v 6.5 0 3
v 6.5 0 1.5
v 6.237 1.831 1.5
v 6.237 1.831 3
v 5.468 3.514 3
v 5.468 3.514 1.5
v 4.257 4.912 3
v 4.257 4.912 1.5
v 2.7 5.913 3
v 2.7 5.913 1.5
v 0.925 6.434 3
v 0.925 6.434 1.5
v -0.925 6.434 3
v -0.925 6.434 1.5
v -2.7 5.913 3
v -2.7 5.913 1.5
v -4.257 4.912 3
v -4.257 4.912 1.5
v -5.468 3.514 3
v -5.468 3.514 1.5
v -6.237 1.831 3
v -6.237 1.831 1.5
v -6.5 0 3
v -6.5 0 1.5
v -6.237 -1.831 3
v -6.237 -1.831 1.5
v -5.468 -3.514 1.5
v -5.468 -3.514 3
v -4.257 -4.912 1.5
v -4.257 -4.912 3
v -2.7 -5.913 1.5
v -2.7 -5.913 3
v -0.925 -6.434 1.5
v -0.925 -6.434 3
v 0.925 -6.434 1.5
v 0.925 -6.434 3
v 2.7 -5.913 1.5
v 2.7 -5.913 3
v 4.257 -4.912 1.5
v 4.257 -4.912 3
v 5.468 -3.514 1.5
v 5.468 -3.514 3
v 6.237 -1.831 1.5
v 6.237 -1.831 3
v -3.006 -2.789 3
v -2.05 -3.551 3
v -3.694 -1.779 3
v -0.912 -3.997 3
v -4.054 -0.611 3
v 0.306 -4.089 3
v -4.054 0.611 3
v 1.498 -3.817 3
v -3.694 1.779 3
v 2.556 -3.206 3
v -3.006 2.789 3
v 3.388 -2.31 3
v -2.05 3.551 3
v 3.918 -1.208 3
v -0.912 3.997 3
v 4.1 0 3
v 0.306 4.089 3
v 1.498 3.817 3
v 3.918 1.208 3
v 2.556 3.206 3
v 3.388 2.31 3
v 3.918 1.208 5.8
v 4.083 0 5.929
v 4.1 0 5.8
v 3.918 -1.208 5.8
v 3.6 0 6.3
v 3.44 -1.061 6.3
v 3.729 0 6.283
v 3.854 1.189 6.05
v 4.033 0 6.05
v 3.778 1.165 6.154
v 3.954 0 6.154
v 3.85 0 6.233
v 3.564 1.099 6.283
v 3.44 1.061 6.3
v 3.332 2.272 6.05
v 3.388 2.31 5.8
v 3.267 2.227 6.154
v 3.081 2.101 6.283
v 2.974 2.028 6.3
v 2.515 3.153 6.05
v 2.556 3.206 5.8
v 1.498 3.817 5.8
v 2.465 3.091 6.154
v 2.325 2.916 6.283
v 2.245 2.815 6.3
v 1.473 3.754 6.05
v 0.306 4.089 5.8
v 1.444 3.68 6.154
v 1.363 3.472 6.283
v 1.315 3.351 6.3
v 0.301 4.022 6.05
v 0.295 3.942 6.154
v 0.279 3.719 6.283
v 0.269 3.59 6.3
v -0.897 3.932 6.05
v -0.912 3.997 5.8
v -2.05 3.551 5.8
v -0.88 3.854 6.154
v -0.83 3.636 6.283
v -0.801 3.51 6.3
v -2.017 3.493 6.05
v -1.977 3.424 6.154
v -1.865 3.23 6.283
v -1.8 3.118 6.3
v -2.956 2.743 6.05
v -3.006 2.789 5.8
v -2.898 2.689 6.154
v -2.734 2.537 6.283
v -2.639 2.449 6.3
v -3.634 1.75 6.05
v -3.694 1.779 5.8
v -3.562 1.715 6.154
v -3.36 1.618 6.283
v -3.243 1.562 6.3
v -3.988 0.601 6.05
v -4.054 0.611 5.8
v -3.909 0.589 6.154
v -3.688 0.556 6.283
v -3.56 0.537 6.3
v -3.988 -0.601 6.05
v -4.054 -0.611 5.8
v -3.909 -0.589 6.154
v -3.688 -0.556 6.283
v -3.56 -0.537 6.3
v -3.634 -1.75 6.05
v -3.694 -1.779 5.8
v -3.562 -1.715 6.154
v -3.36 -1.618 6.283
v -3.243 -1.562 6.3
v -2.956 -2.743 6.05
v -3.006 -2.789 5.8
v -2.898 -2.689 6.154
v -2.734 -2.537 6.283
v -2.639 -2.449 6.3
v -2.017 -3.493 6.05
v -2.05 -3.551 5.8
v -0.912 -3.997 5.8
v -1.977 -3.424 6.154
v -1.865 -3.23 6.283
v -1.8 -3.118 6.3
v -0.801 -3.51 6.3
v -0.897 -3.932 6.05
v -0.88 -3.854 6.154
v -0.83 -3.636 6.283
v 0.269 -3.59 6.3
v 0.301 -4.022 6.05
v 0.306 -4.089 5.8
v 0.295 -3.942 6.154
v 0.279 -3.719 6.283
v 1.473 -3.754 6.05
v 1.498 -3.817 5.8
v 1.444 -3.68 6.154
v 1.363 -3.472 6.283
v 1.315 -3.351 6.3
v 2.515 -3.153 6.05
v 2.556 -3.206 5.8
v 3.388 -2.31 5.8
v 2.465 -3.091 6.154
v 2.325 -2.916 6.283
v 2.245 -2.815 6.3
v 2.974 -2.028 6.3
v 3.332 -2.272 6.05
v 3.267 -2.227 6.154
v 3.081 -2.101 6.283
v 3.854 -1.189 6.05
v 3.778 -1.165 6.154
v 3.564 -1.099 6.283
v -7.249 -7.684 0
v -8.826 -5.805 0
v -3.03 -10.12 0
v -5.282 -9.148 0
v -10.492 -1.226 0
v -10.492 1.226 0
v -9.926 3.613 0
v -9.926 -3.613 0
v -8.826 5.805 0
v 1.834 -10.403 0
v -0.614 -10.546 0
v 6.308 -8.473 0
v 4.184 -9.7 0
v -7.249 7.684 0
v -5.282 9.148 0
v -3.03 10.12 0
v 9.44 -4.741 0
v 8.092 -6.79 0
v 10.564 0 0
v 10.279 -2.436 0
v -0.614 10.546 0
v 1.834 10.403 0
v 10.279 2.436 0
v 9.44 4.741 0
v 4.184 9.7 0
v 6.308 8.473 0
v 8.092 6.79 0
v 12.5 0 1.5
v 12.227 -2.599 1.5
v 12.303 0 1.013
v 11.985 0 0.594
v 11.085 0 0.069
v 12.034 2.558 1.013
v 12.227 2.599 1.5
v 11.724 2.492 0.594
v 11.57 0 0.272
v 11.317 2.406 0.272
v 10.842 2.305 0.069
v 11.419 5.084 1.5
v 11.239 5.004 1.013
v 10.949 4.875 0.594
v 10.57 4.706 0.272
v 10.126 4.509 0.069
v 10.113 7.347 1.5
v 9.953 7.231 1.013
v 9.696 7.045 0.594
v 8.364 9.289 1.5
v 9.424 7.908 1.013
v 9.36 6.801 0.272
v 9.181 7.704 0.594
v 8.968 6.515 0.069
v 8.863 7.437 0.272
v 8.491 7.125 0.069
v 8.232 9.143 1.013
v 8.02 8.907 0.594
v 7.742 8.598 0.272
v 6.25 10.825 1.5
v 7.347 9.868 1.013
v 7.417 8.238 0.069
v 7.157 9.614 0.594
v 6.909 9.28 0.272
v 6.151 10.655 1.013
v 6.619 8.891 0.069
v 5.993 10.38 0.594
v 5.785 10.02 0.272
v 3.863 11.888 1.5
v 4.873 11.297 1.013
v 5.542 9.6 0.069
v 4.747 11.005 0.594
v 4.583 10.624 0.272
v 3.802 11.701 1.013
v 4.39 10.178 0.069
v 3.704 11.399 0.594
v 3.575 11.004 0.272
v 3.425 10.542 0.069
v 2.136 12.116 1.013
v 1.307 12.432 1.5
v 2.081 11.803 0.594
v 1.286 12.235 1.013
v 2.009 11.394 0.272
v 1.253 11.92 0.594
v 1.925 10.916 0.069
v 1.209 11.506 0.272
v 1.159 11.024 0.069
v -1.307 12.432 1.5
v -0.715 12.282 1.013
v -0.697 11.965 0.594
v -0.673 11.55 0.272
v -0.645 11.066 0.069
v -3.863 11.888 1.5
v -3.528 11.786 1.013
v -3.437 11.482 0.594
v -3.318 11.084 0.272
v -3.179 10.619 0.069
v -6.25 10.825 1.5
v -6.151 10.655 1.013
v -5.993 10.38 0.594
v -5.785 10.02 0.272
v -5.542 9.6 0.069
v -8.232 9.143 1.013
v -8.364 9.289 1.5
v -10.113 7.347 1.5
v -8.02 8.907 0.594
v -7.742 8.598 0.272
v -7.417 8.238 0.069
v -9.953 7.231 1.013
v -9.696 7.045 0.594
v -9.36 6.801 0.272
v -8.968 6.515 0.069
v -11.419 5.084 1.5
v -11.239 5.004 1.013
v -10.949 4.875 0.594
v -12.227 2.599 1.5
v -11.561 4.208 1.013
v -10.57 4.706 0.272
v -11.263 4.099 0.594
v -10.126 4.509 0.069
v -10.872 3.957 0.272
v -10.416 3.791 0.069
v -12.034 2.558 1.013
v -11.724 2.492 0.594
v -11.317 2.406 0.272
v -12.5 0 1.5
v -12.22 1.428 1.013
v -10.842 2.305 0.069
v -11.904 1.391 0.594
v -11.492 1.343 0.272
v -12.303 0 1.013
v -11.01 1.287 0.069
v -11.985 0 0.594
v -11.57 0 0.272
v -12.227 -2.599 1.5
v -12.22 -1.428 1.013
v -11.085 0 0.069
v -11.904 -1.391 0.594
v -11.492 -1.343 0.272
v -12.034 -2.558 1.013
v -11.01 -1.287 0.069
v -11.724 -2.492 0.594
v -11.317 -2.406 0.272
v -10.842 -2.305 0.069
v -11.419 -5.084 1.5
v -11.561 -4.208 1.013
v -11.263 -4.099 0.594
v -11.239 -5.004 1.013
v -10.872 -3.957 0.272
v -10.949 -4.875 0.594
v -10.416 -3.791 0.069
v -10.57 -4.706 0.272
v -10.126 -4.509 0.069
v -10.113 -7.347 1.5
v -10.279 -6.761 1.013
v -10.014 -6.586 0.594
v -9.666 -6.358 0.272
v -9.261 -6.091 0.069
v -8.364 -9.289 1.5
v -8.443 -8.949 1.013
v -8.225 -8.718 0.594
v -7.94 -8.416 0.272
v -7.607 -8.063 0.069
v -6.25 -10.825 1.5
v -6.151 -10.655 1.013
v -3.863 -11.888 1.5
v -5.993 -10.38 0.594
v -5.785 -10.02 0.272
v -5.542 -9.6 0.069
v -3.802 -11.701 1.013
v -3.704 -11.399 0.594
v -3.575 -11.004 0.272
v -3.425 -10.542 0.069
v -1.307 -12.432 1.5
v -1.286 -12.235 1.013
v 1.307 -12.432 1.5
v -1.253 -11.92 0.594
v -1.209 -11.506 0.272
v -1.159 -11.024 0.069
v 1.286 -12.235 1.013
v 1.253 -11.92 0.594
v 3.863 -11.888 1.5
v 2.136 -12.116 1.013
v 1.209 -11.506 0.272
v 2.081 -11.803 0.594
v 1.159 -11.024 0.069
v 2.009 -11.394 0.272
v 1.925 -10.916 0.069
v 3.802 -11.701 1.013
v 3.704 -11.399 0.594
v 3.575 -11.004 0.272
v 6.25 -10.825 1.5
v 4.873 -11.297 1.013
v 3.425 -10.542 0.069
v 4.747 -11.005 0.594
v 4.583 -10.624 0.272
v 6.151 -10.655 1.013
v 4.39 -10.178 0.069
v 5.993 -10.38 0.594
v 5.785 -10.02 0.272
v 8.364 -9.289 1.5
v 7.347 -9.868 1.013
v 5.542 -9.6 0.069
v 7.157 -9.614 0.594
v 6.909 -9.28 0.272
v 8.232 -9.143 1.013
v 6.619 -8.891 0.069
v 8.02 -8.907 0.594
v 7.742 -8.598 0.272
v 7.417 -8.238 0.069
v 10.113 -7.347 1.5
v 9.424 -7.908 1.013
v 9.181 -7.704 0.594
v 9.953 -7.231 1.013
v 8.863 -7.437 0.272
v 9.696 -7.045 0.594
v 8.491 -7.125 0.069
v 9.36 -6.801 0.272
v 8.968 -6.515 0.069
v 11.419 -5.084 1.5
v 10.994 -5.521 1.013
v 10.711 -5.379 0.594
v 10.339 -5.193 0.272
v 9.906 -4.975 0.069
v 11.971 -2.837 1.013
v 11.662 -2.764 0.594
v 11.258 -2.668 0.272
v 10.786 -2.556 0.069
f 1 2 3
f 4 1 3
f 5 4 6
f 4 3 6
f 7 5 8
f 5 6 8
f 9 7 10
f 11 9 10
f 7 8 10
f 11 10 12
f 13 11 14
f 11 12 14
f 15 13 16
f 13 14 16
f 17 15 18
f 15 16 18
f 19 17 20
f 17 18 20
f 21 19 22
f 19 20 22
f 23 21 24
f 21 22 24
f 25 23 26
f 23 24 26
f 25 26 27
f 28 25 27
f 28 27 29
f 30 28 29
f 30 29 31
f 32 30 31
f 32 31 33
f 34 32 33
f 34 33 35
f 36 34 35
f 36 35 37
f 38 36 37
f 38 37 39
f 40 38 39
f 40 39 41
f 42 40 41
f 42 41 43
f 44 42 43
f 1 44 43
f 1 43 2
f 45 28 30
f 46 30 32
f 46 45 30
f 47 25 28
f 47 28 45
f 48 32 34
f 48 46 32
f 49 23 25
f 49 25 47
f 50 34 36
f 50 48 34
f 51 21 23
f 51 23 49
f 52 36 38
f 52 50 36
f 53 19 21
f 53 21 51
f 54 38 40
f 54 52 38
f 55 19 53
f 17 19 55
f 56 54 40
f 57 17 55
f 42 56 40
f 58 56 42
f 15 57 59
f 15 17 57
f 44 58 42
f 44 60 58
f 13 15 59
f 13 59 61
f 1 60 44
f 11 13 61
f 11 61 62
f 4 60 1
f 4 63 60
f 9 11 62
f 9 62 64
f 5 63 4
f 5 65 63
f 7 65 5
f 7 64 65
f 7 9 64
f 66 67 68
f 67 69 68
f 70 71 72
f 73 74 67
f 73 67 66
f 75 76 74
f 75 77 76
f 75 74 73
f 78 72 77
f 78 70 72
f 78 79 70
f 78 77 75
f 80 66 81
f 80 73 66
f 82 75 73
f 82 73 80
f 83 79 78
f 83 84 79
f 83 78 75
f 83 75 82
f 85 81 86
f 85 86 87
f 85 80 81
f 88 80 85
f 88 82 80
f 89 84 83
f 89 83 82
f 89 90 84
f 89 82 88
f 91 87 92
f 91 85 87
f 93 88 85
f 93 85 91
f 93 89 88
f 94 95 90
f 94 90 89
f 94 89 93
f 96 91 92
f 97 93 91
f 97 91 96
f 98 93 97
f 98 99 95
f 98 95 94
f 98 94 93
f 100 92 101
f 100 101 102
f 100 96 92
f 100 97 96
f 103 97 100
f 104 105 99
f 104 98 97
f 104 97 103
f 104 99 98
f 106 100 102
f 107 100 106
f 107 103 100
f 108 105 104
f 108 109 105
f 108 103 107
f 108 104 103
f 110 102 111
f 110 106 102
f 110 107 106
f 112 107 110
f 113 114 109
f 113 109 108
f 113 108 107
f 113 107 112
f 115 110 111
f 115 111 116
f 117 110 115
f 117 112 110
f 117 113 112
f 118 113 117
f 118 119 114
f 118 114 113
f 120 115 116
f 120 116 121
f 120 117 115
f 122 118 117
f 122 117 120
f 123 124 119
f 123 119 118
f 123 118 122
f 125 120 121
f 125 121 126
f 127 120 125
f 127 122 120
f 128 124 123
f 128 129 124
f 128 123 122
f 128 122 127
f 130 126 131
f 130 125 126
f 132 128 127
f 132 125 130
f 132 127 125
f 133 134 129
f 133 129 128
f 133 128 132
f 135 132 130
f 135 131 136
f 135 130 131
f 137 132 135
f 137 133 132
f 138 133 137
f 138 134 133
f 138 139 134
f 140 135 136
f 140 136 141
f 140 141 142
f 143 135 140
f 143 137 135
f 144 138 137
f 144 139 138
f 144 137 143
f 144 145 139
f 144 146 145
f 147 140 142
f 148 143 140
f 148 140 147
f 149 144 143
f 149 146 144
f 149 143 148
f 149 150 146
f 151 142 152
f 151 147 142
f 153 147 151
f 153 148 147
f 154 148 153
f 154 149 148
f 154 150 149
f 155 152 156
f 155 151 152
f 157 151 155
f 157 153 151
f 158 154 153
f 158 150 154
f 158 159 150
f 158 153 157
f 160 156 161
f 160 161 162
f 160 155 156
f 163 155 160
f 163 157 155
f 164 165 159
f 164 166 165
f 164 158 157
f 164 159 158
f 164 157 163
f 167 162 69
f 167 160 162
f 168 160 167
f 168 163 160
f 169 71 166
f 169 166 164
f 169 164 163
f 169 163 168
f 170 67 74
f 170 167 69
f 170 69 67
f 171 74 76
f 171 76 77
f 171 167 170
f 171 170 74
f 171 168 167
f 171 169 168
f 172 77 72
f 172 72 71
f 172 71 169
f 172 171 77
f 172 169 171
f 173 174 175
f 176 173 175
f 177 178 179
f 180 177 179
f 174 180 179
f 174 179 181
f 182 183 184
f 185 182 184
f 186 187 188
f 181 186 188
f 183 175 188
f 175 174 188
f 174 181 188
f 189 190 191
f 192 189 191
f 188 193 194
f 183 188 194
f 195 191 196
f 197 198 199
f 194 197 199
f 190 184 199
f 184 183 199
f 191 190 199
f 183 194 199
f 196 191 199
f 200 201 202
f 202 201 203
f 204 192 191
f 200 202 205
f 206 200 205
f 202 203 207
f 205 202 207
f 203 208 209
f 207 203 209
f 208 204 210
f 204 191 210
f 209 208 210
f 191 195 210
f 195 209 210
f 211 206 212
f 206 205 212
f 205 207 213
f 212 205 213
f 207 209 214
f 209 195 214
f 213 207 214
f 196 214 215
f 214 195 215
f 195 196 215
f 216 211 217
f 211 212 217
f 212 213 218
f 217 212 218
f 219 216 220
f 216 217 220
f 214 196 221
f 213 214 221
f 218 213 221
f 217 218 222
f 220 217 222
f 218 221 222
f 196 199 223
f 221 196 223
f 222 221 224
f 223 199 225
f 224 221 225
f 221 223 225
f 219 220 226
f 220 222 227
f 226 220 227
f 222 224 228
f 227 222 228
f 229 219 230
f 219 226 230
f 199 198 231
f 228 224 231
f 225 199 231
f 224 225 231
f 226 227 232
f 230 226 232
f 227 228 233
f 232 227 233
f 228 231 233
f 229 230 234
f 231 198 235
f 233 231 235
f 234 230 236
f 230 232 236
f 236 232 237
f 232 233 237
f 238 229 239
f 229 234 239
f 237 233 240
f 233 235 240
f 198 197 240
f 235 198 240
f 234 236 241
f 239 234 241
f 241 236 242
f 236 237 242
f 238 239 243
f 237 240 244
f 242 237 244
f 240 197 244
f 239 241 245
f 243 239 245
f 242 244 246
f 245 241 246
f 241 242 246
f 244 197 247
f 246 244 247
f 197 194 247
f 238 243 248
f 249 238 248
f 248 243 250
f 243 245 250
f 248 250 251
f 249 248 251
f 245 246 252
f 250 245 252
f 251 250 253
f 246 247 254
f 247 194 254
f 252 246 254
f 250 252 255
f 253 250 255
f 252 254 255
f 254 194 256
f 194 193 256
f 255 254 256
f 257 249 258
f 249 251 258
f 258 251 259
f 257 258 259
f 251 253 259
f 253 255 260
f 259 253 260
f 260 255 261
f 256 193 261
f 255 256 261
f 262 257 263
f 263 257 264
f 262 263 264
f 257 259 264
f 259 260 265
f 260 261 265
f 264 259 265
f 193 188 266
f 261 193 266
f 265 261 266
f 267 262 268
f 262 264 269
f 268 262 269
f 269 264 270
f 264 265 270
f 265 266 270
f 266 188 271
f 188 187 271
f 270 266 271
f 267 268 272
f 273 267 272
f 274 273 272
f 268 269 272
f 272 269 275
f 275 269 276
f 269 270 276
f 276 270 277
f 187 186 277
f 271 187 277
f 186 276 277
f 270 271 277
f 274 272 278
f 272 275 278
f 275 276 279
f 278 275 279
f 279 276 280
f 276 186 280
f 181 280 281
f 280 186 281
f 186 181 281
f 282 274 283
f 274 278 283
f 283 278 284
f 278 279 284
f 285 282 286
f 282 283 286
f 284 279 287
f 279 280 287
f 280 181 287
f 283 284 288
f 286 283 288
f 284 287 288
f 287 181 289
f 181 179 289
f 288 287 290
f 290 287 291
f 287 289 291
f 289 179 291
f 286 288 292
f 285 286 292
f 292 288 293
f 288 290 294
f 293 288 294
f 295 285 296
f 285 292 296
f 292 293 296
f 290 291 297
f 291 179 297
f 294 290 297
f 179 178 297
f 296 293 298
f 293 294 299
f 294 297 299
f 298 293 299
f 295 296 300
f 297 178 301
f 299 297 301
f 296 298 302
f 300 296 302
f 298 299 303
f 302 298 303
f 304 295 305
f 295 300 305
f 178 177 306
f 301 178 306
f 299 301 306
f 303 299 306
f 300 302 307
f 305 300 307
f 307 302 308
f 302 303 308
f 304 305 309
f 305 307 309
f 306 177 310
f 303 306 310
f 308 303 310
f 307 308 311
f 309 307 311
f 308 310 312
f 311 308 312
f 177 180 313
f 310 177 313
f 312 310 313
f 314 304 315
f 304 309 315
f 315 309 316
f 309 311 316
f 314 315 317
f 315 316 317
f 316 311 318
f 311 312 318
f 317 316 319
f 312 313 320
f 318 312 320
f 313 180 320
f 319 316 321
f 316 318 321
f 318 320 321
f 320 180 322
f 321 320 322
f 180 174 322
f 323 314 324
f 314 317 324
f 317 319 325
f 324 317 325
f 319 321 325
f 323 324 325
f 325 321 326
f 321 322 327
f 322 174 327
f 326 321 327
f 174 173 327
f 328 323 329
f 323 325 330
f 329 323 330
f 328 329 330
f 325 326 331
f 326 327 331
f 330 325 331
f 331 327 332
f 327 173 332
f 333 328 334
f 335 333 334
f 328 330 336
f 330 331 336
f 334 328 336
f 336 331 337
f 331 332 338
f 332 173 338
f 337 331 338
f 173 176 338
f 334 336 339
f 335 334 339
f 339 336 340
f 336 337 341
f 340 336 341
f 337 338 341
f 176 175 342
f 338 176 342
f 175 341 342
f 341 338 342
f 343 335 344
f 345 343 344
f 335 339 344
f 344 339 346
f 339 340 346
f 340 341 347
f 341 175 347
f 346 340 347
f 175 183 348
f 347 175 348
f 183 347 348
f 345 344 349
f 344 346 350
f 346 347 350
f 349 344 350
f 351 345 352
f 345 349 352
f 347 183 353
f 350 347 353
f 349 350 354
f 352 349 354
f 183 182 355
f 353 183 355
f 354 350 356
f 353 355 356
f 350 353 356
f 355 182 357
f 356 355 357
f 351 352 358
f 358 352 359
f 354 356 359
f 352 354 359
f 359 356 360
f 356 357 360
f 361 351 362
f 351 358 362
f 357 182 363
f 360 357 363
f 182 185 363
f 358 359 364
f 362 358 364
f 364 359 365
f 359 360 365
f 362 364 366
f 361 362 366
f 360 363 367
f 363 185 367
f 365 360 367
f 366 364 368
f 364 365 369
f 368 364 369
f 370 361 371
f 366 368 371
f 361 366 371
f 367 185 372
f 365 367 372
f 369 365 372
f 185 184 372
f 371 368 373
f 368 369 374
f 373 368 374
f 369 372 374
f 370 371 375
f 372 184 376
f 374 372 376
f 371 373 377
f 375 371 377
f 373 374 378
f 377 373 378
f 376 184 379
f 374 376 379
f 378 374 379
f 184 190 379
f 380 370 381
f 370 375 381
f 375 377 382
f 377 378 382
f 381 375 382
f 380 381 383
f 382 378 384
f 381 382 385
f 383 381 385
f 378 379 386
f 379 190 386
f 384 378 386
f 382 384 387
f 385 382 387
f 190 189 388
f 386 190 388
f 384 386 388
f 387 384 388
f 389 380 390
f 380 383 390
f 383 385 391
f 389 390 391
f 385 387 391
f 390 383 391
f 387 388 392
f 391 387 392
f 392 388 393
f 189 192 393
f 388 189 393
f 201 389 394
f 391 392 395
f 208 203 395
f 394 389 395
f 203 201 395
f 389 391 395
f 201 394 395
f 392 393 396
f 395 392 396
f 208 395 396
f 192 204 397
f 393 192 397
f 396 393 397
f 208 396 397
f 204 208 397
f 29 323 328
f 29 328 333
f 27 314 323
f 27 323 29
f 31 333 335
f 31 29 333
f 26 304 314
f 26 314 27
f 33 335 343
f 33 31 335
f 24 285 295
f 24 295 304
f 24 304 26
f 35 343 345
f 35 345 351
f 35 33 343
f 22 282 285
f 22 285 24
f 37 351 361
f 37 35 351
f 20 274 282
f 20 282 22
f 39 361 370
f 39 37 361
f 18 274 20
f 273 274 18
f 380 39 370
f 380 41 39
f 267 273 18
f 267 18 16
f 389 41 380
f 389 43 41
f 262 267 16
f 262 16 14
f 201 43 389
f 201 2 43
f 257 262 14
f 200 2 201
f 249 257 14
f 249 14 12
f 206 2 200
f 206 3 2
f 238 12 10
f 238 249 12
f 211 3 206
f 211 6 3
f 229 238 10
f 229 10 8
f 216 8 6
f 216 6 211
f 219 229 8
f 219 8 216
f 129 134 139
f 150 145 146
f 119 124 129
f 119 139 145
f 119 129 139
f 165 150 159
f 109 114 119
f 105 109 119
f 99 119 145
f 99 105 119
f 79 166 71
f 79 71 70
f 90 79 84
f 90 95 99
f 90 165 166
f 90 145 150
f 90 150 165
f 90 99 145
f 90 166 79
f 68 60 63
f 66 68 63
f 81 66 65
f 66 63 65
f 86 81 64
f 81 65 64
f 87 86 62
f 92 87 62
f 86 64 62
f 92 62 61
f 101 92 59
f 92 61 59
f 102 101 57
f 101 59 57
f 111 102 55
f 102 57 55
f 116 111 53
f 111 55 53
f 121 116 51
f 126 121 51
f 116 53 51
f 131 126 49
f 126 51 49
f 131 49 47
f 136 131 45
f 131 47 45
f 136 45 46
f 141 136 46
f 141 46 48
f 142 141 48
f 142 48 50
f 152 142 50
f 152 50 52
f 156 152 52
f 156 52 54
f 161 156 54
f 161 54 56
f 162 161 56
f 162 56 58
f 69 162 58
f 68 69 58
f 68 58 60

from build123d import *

# Parameters (mm, degrees)
F0_R     = 4.1
F1_DEPTH = 6.3
F0_R_2   = 6.5
F2_DEPTH = 3
F0_R_3   = 12.5
F3_DEPTH = 1.5
F4_R     = 0.5


# Not quite as in the source:
# - a fillet or chamfer that OpenCascade refuses, or shapes differently, is made with other operations: its cross-section is extruded or revolved along the edge and cut away or added
# - a feature names something its author has since deleted; it is built from what else it names


with BuildPart() as f1:
    # F0 (on Top) → F1 (new body)
    with BuildSketch(Plane.XY):
        Circle(F0_R)
    extrude(amount=F1_DEPTH)

    # F0 (on Top) → F2 (join)
    with BuildSketch(Plane.XY):
        Circle(F0_R_2)
        Circle(F0_R, mode=Mode.SUBTRACT)
    extrude(amount=F2_DEPTH)

    # F0 (on Top) → F3 (join)
    with BuildSketch(Plane.XY):
        Circle(F0_R_3)
        Circle(F0_R_2, mode=Mode.SUBTRACT)
    extrude(amount=F3_DEPTH)

    # F4
    f4_edges = [f1.edges().sort_by_distance(p)[0] for p in [
        (-4.1, 0, 6.3),
    ]]
    fillet(f4_edges, radius=F4_R)

    # F5: fillet of radius 2 on 1 edges, made by hand

    # F5_s1 → F5_t2 (revolve, cut)
    with BuildSketch(Plane.XZ):
        with BuildLine():
            ThreePointArc((12.5, 1.5), (11.7882531983, 0.4188611699), (10.5635083269, 0))
            Line((10.5635083269, 0), (12.5, 0))
            Line((12.5, 0), (12.5, 1.5))
        make_face()
    revolve(axis=Axis((0, 0, 0), (0, 0, 1)), mode=Mode.SUBTRACT)


solid = f1.part
